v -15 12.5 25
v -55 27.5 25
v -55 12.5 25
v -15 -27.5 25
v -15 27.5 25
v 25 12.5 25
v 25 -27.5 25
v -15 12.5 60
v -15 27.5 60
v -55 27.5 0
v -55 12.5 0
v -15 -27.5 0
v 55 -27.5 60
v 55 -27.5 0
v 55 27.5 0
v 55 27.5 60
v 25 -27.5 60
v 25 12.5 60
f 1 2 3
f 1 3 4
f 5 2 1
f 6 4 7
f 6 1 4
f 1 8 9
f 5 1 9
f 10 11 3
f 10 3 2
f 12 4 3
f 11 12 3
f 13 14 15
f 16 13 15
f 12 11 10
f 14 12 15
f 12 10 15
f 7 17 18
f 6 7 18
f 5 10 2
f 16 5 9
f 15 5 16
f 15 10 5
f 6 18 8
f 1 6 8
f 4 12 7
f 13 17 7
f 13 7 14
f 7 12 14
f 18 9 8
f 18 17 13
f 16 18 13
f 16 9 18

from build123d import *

# Parameters (mm, degrees)
F0_W     = 110
F0_H     = 55
F1_DEPTH = 60
F3_DEPTH = 60.001
F5_DEPTH = 35


with BuildPart() as f1:
    # F0 (on Top) → F1 (new body)
    with BuildSketch(Plane.XY):
        Rectangle(F0_W, F0_H)
    extrude(amount=F1_DEPTH)

    # F2 (on face) → F3 (cut, through all)
    with BuildSketch(Plane.XY.offset(60)):
        Polygon((-15, -27.5), (-55, 12.5), (-55, -27.5), align=None)
    extrude(amount=-F3_DEPTH, mode=Mode.SUBTRACT)

    # F4 (on face) → F5 (cut)
    with BuildSketch(Plane.XY.offset(60)):
        Polygon((-15, -27.5), (25, -27.5), (25, 12.5), (-15, 12.5), (-15, 27.5), (-55, 27.5), (-55, 12.5), align=None)
    extrude(amount=-F5_DEPTH, mode=Mode.SUBTRACT)


solid = f1.part
